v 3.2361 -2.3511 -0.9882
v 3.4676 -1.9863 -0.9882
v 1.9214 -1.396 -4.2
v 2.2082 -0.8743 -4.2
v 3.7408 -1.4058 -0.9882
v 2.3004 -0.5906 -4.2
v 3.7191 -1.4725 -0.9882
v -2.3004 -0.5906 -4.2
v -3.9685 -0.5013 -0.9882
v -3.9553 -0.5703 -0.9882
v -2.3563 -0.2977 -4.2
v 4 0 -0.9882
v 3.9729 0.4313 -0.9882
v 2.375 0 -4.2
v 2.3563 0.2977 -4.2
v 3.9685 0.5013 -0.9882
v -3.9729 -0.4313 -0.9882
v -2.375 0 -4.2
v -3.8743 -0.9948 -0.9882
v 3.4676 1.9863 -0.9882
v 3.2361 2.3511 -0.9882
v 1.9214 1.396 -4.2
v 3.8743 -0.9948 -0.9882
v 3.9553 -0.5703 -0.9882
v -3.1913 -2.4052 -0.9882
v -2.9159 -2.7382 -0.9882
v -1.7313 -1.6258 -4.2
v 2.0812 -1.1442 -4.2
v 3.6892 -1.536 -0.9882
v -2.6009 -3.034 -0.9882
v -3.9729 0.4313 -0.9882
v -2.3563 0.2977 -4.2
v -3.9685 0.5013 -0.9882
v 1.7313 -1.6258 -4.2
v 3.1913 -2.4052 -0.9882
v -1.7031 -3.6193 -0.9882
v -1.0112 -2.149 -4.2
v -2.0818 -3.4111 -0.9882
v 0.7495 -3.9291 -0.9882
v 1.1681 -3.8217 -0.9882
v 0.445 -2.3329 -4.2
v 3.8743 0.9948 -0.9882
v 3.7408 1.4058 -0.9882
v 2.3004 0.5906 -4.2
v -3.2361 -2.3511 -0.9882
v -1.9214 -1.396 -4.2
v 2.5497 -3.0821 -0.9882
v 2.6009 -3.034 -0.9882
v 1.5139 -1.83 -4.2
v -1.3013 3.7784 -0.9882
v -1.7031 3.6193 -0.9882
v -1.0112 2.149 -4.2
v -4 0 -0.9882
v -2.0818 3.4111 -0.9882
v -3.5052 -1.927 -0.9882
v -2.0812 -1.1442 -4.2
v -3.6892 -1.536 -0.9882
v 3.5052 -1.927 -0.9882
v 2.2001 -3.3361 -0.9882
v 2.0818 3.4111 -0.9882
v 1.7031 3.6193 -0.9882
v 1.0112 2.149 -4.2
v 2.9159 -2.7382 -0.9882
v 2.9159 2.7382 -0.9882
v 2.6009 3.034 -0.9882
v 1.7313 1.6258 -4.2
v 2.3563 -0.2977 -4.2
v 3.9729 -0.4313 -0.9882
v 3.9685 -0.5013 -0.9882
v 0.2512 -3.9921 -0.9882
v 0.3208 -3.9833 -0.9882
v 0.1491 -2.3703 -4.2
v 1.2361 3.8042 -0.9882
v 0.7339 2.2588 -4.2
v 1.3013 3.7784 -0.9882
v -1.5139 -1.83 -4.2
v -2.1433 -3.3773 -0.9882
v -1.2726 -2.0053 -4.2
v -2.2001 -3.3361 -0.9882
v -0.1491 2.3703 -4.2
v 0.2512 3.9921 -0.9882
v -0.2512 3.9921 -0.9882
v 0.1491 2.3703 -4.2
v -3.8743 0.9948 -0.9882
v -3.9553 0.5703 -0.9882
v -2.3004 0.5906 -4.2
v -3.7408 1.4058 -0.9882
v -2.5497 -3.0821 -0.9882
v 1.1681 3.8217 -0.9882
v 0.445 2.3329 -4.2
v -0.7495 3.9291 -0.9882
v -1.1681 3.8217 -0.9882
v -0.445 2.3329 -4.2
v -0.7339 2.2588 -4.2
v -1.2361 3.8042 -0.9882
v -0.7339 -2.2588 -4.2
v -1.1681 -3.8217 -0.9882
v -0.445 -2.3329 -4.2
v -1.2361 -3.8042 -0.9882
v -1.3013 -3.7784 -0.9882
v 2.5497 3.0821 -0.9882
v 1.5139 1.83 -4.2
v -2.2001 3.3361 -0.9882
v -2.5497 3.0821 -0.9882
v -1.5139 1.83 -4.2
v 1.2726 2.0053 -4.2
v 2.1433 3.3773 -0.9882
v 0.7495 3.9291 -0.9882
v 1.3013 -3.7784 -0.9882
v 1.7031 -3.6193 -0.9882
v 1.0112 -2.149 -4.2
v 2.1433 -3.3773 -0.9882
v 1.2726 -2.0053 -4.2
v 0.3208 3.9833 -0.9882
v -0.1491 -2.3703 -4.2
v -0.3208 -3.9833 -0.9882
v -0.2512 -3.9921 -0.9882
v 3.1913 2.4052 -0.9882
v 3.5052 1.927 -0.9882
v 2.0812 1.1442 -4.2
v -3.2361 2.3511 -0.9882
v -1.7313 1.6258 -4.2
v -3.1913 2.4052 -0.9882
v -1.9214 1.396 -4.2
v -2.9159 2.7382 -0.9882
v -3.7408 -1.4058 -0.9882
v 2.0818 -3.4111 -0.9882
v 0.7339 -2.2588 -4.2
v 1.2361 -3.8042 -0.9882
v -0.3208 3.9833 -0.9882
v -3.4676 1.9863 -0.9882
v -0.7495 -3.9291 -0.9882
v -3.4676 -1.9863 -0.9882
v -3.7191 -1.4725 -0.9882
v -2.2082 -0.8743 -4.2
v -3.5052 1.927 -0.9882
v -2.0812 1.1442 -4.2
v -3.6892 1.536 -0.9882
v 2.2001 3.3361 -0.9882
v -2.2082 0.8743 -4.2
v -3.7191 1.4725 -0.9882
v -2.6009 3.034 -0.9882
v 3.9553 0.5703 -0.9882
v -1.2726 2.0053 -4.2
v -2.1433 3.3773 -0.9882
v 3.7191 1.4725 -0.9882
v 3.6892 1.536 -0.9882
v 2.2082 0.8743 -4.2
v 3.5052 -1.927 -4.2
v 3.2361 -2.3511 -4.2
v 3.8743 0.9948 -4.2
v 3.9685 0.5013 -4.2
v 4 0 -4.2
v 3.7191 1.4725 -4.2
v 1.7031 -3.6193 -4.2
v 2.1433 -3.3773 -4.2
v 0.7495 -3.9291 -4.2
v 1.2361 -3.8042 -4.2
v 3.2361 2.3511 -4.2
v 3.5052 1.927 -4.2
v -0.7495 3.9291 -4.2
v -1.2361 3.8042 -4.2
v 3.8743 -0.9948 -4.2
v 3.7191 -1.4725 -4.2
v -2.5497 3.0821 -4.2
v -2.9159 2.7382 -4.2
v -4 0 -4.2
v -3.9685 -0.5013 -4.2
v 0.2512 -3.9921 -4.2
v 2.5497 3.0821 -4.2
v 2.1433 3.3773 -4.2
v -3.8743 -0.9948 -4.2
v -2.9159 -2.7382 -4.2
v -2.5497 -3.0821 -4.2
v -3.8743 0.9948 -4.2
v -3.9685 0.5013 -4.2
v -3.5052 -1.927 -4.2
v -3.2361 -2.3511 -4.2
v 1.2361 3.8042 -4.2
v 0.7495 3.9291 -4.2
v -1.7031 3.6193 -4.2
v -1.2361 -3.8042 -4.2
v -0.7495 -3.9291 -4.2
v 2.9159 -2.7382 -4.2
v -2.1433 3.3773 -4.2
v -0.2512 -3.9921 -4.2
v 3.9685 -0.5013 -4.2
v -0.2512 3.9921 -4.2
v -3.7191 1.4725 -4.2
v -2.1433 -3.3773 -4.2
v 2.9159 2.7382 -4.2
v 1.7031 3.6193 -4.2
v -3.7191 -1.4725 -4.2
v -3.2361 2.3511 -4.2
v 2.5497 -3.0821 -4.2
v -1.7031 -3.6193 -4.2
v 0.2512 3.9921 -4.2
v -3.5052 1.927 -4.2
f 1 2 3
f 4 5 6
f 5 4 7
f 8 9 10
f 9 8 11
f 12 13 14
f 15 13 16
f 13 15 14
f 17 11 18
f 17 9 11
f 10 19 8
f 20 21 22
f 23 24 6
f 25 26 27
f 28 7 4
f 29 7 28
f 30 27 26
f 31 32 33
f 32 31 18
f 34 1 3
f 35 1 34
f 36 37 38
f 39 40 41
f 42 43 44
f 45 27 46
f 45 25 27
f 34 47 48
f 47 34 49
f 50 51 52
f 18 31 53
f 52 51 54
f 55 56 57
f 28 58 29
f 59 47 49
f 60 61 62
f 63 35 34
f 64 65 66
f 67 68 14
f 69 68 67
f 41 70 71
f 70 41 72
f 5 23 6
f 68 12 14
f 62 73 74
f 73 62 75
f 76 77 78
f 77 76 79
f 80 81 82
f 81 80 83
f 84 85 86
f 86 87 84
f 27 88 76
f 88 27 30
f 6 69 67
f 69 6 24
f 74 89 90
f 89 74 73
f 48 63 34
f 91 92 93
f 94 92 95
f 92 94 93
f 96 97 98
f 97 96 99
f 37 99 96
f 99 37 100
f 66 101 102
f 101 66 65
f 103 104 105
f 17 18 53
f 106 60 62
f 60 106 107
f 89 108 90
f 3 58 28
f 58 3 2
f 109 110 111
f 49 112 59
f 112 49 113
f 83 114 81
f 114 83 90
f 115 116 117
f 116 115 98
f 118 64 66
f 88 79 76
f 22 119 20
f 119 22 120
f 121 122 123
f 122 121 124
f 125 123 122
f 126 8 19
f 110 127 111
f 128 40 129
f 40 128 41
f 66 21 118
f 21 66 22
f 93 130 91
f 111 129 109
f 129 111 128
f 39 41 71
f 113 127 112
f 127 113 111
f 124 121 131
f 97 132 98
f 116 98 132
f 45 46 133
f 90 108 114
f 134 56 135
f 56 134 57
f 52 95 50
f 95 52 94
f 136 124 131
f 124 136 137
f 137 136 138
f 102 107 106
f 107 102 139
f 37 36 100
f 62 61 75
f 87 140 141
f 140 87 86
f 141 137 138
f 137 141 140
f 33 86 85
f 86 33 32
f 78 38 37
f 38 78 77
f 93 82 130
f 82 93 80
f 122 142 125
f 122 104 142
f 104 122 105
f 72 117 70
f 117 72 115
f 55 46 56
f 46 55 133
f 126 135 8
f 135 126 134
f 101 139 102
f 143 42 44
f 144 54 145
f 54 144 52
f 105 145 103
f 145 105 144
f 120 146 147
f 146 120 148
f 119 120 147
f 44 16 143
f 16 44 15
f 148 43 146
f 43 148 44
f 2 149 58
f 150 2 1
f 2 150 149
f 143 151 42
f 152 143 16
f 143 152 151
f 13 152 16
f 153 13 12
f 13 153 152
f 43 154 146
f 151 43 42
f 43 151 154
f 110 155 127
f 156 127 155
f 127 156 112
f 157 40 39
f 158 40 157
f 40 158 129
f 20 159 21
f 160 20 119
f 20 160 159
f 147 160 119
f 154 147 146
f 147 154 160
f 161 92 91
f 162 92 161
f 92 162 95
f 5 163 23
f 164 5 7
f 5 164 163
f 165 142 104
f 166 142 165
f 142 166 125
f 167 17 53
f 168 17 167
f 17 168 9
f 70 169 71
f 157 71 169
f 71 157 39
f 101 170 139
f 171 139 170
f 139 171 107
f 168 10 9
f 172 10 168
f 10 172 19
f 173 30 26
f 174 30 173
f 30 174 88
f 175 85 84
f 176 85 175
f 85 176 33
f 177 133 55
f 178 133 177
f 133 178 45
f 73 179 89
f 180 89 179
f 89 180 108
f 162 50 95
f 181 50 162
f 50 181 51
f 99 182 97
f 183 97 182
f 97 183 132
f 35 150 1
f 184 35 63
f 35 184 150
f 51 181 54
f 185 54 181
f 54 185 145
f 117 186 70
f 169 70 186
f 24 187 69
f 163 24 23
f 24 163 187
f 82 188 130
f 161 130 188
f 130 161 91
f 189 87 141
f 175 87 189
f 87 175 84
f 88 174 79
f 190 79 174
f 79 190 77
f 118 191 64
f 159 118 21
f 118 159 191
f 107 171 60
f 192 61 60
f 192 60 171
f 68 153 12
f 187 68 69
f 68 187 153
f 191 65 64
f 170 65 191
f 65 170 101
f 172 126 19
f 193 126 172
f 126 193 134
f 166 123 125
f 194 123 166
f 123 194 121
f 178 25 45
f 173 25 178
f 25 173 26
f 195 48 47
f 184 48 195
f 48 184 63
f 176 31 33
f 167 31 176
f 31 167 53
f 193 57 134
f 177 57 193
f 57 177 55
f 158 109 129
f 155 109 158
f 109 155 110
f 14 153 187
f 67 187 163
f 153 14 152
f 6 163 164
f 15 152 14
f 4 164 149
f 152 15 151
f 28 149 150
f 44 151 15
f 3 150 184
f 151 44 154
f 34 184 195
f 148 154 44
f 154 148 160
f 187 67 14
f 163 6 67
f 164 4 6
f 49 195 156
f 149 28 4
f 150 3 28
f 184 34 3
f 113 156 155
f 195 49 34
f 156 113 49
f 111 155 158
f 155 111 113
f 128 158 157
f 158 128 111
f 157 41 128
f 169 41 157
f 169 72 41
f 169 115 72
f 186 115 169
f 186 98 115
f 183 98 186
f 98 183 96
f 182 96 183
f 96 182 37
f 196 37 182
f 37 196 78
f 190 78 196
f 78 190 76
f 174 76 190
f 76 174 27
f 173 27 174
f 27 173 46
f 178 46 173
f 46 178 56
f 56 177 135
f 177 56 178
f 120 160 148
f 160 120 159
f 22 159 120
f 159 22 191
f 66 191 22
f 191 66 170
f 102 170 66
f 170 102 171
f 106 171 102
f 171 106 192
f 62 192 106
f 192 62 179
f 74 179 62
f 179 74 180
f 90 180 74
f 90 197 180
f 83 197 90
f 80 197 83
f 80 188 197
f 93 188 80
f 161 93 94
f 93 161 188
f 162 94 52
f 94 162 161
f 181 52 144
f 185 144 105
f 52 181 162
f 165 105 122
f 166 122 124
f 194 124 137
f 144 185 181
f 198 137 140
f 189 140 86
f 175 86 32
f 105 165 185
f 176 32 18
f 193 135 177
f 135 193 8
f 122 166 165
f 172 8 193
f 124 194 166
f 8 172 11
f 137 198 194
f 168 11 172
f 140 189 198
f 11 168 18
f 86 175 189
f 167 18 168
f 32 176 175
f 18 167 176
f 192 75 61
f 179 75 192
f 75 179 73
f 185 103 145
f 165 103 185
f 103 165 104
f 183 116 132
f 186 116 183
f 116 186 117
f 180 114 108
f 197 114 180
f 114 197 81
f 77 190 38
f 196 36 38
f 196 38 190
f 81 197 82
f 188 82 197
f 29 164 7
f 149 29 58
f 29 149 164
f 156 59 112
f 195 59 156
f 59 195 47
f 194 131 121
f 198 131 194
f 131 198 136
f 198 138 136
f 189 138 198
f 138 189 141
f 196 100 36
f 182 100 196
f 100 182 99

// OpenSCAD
$fn = 50;

difference() {
	union() {
		translate(v = [0, 0, -4.2]) {
			cylinder(h = 4.2, r = 4.0);
		}
	}
	union() {
		translate(v = [0, 0, 0]) {
			rotate(a = [0, 0, 0]) {
				difference() {
					union() {
						translate(v = [0, 0, -7.2]) {
							cylinder(h = 7.2, r = 2.25);
						}
						translate(v = [0, 0, -4.2]) {
							cylinder(h = 4.2, r1 = 2.375, r2 = 4.5);
						}
						translate(v = [0, 0, -7.2]) {
							cylinder(h = 7.2, r = 2.375);
						}
						translate(v = [0, 0, -7.2]) {
							cylinder(h = 7.2, r = 2.25);
						}
					}
					union();
				}
			}
		}
	}
}
